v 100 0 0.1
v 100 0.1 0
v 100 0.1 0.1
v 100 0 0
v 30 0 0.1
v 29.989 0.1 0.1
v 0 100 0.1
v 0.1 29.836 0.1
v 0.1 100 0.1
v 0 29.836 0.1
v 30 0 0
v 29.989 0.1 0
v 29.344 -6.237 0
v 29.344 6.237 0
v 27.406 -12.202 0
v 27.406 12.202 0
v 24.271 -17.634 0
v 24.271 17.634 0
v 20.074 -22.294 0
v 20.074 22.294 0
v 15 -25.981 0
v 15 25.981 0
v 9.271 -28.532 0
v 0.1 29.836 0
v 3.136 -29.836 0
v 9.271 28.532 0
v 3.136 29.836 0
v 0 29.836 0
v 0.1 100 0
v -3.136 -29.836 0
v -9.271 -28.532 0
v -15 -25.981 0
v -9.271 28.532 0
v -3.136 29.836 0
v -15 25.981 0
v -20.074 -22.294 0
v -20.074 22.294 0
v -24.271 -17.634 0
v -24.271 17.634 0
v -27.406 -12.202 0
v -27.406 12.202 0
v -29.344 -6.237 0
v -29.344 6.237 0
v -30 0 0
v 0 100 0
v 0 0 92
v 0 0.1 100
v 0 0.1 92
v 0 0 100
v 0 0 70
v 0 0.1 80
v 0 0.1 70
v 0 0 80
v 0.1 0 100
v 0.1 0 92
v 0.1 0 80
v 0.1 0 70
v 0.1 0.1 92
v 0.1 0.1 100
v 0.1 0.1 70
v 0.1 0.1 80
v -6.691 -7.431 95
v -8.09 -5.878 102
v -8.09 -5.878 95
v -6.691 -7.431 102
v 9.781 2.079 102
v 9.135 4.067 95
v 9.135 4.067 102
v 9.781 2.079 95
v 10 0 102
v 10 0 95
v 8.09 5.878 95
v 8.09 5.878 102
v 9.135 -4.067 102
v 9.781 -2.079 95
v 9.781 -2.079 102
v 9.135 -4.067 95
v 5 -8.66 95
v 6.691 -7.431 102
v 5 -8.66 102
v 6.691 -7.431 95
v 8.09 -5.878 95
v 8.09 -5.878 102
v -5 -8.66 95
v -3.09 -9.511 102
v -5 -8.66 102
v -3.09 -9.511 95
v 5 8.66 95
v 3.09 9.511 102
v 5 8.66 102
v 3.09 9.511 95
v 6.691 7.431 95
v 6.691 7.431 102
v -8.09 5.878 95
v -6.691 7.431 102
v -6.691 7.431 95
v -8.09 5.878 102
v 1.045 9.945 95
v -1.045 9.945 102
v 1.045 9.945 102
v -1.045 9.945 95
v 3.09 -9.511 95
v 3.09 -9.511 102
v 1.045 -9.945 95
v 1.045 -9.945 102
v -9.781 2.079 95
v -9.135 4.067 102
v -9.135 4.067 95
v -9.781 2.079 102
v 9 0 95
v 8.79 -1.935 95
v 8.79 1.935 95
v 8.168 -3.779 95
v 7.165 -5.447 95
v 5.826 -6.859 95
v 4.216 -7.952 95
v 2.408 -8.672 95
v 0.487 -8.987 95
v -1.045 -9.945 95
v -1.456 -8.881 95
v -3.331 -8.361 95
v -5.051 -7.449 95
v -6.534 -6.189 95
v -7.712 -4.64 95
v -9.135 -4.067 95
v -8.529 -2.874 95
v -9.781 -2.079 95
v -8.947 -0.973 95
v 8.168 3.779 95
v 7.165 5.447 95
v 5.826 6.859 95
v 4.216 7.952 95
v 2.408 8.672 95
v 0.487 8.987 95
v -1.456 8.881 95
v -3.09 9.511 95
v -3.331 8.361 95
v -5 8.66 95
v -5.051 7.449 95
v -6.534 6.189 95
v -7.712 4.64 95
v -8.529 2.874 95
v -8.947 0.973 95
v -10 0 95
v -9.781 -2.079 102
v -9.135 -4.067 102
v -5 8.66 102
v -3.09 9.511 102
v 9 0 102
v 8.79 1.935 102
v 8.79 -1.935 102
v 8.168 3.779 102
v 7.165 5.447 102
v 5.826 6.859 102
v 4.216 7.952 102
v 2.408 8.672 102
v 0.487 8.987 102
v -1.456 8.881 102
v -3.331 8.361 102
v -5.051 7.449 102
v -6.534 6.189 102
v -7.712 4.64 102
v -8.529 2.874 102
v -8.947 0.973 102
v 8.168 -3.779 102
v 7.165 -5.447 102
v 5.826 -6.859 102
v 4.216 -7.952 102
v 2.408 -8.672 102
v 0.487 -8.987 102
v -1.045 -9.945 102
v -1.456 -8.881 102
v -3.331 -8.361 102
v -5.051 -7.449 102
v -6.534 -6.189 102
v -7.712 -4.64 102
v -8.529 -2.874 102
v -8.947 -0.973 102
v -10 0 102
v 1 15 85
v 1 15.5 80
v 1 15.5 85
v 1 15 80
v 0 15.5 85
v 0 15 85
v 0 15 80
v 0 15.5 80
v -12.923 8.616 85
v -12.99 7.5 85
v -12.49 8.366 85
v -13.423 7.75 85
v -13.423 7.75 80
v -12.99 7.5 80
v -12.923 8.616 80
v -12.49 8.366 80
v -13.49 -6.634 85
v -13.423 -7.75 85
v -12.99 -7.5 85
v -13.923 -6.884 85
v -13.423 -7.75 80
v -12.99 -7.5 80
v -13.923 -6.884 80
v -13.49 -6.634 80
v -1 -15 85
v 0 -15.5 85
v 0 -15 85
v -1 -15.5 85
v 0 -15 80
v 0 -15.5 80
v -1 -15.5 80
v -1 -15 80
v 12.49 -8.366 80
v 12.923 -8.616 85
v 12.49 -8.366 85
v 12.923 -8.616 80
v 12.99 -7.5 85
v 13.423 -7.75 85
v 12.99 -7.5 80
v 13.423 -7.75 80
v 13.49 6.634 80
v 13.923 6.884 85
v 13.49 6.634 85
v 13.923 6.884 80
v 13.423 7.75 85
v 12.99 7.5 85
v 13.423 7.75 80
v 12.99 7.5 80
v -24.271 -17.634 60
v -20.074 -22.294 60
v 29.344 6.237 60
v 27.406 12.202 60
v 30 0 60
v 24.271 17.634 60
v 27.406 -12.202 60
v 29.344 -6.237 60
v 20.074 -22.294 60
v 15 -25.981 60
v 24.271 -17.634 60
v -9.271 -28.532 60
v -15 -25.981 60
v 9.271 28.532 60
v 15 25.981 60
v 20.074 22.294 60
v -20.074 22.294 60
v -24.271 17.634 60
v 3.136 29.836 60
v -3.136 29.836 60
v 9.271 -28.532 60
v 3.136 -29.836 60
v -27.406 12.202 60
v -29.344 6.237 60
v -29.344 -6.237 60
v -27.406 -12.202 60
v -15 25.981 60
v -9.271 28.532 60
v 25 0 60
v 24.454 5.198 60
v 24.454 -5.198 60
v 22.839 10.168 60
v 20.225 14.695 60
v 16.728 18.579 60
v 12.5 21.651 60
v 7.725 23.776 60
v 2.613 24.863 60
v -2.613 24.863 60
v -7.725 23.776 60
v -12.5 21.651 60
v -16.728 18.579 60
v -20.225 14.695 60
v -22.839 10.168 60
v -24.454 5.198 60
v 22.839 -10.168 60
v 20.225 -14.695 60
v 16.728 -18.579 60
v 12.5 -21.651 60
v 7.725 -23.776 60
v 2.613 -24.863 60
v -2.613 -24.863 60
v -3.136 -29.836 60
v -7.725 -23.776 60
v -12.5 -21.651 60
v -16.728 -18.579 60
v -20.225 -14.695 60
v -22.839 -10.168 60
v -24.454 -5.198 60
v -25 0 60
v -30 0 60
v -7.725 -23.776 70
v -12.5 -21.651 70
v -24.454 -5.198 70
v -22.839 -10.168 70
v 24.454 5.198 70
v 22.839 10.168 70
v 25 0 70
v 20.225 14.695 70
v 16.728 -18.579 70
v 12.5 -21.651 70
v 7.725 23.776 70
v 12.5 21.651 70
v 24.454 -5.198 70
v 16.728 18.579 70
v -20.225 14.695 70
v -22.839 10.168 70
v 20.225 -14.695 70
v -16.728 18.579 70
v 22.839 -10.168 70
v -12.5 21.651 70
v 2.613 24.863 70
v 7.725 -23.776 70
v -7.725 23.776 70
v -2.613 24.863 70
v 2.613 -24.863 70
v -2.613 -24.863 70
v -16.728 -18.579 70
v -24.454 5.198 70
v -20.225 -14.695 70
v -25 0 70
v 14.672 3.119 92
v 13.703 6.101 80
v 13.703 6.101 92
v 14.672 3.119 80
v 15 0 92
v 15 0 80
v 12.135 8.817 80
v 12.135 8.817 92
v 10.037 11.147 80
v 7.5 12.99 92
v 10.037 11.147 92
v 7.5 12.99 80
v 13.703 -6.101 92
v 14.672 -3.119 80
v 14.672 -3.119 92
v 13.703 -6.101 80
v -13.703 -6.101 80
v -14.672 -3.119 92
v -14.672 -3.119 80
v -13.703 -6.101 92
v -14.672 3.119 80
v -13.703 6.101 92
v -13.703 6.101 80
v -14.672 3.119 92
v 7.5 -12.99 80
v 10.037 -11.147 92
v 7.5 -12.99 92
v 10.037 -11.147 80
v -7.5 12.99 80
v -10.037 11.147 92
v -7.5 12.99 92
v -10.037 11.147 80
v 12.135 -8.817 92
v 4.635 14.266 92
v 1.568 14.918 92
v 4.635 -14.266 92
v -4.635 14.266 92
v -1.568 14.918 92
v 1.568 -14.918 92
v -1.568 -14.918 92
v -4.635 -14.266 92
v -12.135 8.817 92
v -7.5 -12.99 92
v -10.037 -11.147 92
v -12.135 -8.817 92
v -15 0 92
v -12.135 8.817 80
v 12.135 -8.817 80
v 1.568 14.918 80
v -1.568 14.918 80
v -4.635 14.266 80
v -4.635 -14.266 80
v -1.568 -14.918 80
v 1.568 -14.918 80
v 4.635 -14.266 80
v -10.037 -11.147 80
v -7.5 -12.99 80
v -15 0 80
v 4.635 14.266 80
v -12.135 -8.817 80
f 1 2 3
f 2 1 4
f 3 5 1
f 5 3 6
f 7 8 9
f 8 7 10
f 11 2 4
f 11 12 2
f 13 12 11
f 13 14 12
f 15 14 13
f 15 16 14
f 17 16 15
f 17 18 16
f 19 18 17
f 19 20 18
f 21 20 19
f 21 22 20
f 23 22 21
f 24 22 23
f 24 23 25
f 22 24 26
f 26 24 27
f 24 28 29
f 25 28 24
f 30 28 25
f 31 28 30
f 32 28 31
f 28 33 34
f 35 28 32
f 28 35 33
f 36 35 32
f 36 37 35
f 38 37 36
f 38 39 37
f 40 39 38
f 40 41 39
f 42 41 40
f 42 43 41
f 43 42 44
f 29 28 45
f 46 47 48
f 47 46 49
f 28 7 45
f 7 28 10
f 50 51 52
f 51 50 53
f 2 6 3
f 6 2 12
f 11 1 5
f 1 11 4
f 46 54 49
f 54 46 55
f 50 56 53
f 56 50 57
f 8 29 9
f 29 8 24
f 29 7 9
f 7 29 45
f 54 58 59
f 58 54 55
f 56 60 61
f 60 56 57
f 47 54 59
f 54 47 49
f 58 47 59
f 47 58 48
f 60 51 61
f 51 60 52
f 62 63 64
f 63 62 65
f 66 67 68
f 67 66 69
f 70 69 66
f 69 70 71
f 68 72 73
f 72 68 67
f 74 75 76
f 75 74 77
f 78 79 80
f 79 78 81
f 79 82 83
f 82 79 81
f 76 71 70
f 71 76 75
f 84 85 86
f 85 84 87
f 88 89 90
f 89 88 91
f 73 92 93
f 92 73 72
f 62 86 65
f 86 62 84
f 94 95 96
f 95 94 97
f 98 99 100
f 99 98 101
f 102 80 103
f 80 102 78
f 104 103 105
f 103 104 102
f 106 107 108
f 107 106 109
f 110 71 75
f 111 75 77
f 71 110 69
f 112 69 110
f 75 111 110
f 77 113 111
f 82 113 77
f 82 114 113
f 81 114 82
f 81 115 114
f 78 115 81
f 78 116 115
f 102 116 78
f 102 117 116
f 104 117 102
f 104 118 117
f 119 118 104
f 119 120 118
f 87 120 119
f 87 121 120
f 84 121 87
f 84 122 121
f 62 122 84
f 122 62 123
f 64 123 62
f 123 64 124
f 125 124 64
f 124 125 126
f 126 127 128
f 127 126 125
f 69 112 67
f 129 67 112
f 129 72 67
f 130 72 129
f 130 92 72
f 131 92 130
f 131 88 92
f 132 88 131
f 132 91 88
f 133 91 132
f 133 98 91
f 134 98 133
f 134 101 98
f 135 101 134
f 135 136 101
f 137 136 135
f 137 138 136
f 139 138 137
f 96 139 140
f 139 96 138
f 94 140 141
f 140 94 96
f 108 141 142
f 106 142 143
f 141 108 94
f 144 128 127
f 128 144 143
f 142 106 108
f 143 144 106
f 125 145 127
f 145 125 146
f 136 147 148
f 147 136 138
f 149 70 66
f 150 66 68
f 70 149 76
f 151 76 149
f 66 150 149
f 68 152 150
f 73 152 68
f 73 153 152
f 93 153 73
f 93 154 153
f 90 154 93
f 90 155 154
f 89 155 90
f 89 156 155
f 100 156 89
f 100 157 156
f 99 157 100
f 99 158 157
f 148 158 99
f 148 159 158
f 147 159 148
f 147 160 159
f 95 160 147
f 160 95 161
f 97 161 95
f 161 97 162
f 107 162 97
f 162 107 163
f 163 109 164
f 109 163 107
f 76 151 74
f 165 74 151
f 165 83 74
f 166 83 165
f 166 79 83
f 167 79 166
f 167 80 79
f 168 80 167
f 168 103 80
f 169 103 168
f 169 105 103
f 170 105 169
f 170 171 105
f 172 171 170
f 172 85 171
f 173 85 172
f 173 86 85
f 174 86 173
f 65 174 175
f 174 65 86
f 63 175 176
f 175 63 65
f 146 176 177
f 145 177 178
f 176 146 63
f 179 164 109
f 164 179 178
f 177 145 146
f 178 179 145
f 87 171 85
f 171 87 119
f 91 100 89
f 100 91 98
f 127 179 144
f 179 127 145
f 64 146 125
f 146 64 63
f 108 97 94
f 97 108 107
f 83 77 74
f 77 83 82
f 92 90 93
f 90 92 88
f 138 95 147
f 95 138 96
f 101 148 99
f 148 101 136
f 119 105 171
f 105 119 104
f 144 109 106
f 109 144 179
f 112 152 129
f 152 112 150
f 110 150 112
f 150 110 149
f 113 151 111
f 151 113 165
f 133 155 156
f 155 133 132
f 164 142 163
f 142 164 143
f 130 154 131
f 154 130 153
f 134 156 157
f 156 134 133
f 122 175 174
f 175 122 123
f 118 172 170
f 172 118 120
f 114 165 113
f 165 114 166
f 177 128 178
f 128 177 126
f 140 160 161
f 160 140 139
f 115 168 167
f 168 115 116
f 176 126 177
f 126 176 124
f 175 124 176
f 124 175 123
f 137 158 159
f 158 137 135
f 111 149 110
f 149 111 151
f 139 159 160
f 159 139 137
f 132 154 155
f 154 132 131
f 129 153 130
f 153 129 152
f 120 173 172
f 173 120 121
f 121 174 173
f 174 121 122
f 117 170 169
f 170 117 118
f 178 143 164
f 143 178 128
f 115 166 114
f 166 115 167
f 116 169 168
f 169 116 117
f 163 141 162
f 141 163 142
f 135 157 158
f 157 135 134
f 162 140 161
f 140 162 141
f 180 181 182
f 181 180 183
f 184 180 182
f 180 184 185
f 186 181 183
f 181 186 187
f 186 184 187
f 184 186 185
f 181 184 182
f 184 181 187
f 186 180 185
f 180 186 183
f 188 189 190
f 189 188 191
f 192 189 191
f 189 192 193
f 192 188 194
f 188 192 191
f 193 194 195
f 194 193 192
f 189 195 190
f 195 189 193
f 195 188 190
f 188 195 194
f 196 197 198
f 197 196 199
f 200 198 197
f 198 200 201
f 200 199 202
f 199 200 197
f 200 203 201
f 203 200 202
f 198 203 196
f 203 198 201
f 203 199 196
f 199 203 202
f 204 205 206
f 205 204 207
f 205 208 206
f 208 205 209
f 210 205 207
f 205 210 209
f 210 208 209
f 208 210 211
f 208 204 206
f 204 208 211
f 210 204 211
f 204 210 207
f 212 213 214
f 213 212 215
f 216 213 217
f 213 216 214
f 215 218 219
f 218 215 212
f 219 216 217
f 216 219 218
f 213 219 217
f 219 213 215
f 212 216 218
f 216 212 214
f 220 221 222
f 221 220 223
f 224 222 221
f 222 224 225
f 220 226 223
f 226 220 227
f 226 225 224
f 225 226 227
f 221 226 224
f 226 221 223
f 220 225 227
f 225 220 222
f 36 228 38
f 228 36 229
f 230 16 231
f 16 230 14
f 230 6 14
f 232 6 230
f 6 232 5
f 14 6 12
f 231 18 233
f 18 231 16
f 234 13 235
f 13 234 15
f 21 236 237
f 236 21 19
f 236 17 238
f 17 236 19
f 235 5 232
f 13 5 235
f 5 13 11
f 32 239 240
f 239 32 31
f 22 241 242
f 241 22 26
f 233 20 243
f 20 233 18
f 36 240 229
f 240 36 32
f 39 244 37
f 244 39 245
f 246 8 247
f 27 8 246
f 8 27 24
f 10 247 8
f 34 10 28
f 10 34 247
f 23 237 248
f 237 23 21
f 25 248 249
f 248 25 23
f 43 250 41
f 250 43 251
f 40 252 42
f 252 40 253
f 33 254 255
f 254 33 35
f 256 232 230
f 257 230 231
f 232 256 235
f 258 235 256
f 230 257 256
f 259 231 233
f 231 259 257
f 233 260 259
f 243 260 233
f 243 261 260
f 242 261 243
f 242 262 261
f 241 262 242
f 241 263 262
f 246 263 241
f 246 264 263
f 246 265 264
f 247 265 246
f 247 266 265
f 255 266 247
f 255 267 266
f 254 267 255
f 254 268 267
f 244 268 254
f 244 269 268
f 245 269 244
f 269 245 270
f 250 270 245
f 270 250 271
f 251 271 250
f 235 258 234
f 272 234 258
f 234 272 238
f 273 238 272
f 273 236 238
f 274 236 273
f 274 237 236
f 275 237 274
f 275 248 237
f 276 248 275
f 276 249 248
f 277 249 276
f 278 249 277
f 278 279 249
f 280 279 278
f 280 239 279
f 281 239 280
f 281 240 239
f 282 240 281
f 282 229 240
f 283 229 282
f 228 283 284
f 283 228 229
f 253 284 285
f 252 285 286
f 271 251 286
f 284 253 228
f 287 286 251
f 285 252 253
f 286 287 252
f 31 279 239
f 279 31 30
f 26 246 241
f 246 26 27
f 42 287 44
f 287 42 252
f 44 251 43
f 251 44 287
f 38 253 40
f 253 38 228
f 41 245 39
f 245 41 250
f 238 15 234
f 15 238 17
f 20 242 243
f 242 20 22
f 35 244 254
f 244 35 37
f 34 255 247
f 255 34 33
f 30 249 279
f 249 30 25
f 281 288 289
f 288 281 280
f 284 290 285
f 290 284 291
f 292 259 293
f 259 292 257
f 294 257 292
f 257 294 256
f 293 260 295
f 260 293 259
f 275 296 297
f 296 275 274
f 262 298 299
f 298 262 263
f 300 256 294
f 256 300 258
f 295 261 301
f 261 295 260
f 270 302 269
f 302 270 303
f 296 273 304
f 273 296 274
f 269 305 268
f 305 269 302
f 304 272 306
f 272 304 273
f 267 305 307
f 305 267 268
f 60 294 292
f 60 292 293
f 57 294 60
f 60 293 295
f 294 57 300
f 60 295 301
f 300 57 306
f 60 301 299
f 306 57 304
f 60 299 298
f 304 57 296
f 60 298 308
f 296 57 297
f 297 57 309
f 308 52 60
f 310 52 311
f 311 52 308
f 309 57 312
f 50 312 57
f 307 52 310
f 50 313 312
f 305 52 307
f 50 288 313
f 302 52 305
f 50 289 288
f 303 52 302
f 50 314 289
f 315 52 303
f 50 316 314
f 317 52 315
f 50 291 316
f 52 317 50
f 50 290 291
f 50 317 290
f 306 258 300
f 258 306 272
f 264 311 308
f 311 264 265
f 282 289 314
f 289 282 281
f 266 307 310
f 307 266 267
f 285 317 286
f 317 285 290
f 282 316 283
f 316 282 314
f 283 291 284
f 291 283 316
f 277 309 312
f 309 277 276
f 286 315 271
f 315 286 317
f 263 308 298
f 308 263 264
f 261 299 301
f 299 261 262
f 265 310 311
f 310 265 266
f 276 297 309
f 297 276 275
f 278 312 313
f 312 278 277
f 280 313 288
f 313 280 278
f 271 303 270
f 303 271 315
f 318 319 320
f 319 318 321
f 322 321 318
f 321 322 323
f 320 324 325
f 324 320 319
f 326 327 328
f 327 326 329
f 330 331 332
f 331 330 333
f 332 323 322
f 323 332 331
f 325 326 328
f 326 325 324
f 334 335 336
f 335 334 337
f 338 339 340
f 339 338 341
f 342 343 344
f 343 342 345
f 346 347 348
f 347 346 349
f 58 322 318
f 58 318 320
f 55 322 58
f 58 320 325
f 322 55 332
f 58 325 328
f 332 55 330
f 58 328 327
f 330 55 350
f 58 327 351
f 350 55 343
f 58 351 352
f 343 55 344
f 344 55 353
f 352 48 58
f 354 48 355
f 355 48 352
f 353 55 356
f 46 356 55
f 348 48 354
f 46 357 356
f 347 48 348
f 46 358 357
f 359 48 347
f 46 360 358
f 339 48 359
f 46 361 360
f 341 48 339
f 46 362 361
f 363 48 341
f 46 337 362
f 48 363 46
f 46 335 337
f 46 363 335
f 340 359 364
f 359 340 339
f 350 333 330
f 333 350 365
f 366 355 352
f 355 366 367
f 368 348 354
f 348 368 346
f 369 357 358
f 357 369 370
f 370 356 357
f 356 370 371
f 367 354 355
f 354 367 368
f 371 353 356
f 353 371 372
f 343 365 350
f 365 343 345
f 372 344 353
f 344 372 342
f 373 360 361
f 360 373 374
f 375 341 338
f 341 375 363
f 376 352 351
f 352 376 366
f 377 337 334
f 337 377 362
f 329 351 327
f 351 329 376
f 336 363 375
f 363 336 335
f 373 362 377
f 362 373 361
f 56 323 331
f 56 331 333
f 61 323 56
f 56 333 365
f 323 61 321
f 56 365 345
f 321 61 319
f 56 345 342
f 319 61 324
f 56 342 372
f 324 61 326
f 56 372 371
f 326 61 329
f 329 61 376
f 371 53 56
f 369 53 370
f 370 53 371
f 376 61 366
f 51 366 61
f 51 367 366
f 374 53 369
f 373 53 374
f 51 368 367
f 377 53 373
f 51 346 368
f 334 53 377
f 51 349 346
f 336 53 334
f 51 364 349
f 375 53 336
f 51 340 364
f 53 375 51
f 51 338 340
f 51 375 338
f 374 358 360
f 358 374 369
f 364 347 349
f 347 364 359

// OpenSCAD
    // Combined Scene

    // Permanent Model
    
    // Permanent Model (Black)
    color([0, 0, 0]) {
        // Your permanent model code here
        cube([100,0.1,0.1], center = false);
        cube([0.1,100,0.1], center = false);
        cube([0.1,0.1,100], center = false);
    }
    

    // Dynamic Model
    cylinder(h = 60, r = 30); // Main body
translate([0, 0, 60]) {
    scale([1, 1, 0.5])
        cylinder(h = 20, r = 25); // Tapered shoulder
}
translate([0, 0, 80]) {
    scale([1, 1, 0.8])
        cylinder(h = 15, r = 15); // Tapered neck
}
translate([0, 0, 95]) {
    difference() {
        cylinder(h = 7, r = 10); // Cap body
        translate([0, 0, -1])
            cylinder(h = 9, r = 9); // Indentation for cap
    }
}
translate([0, 0, 80]) {
    for (i = [0 : 5]) {
        rotate(i * 60) {
            translate([0, 15, 0]) {
                cube([1, 0.5, 5]); // Texture or branding on neck
            }
        }
    }
}
translate([0, 0, 30]) {
    for (i = [0 : 5]) {
        rotate(i * 60) {
            translate([0, 28, 0]) {
                cube([1.5, 0.5, 7]); // Labeling detail on body
            }
        }
    }
}
    
